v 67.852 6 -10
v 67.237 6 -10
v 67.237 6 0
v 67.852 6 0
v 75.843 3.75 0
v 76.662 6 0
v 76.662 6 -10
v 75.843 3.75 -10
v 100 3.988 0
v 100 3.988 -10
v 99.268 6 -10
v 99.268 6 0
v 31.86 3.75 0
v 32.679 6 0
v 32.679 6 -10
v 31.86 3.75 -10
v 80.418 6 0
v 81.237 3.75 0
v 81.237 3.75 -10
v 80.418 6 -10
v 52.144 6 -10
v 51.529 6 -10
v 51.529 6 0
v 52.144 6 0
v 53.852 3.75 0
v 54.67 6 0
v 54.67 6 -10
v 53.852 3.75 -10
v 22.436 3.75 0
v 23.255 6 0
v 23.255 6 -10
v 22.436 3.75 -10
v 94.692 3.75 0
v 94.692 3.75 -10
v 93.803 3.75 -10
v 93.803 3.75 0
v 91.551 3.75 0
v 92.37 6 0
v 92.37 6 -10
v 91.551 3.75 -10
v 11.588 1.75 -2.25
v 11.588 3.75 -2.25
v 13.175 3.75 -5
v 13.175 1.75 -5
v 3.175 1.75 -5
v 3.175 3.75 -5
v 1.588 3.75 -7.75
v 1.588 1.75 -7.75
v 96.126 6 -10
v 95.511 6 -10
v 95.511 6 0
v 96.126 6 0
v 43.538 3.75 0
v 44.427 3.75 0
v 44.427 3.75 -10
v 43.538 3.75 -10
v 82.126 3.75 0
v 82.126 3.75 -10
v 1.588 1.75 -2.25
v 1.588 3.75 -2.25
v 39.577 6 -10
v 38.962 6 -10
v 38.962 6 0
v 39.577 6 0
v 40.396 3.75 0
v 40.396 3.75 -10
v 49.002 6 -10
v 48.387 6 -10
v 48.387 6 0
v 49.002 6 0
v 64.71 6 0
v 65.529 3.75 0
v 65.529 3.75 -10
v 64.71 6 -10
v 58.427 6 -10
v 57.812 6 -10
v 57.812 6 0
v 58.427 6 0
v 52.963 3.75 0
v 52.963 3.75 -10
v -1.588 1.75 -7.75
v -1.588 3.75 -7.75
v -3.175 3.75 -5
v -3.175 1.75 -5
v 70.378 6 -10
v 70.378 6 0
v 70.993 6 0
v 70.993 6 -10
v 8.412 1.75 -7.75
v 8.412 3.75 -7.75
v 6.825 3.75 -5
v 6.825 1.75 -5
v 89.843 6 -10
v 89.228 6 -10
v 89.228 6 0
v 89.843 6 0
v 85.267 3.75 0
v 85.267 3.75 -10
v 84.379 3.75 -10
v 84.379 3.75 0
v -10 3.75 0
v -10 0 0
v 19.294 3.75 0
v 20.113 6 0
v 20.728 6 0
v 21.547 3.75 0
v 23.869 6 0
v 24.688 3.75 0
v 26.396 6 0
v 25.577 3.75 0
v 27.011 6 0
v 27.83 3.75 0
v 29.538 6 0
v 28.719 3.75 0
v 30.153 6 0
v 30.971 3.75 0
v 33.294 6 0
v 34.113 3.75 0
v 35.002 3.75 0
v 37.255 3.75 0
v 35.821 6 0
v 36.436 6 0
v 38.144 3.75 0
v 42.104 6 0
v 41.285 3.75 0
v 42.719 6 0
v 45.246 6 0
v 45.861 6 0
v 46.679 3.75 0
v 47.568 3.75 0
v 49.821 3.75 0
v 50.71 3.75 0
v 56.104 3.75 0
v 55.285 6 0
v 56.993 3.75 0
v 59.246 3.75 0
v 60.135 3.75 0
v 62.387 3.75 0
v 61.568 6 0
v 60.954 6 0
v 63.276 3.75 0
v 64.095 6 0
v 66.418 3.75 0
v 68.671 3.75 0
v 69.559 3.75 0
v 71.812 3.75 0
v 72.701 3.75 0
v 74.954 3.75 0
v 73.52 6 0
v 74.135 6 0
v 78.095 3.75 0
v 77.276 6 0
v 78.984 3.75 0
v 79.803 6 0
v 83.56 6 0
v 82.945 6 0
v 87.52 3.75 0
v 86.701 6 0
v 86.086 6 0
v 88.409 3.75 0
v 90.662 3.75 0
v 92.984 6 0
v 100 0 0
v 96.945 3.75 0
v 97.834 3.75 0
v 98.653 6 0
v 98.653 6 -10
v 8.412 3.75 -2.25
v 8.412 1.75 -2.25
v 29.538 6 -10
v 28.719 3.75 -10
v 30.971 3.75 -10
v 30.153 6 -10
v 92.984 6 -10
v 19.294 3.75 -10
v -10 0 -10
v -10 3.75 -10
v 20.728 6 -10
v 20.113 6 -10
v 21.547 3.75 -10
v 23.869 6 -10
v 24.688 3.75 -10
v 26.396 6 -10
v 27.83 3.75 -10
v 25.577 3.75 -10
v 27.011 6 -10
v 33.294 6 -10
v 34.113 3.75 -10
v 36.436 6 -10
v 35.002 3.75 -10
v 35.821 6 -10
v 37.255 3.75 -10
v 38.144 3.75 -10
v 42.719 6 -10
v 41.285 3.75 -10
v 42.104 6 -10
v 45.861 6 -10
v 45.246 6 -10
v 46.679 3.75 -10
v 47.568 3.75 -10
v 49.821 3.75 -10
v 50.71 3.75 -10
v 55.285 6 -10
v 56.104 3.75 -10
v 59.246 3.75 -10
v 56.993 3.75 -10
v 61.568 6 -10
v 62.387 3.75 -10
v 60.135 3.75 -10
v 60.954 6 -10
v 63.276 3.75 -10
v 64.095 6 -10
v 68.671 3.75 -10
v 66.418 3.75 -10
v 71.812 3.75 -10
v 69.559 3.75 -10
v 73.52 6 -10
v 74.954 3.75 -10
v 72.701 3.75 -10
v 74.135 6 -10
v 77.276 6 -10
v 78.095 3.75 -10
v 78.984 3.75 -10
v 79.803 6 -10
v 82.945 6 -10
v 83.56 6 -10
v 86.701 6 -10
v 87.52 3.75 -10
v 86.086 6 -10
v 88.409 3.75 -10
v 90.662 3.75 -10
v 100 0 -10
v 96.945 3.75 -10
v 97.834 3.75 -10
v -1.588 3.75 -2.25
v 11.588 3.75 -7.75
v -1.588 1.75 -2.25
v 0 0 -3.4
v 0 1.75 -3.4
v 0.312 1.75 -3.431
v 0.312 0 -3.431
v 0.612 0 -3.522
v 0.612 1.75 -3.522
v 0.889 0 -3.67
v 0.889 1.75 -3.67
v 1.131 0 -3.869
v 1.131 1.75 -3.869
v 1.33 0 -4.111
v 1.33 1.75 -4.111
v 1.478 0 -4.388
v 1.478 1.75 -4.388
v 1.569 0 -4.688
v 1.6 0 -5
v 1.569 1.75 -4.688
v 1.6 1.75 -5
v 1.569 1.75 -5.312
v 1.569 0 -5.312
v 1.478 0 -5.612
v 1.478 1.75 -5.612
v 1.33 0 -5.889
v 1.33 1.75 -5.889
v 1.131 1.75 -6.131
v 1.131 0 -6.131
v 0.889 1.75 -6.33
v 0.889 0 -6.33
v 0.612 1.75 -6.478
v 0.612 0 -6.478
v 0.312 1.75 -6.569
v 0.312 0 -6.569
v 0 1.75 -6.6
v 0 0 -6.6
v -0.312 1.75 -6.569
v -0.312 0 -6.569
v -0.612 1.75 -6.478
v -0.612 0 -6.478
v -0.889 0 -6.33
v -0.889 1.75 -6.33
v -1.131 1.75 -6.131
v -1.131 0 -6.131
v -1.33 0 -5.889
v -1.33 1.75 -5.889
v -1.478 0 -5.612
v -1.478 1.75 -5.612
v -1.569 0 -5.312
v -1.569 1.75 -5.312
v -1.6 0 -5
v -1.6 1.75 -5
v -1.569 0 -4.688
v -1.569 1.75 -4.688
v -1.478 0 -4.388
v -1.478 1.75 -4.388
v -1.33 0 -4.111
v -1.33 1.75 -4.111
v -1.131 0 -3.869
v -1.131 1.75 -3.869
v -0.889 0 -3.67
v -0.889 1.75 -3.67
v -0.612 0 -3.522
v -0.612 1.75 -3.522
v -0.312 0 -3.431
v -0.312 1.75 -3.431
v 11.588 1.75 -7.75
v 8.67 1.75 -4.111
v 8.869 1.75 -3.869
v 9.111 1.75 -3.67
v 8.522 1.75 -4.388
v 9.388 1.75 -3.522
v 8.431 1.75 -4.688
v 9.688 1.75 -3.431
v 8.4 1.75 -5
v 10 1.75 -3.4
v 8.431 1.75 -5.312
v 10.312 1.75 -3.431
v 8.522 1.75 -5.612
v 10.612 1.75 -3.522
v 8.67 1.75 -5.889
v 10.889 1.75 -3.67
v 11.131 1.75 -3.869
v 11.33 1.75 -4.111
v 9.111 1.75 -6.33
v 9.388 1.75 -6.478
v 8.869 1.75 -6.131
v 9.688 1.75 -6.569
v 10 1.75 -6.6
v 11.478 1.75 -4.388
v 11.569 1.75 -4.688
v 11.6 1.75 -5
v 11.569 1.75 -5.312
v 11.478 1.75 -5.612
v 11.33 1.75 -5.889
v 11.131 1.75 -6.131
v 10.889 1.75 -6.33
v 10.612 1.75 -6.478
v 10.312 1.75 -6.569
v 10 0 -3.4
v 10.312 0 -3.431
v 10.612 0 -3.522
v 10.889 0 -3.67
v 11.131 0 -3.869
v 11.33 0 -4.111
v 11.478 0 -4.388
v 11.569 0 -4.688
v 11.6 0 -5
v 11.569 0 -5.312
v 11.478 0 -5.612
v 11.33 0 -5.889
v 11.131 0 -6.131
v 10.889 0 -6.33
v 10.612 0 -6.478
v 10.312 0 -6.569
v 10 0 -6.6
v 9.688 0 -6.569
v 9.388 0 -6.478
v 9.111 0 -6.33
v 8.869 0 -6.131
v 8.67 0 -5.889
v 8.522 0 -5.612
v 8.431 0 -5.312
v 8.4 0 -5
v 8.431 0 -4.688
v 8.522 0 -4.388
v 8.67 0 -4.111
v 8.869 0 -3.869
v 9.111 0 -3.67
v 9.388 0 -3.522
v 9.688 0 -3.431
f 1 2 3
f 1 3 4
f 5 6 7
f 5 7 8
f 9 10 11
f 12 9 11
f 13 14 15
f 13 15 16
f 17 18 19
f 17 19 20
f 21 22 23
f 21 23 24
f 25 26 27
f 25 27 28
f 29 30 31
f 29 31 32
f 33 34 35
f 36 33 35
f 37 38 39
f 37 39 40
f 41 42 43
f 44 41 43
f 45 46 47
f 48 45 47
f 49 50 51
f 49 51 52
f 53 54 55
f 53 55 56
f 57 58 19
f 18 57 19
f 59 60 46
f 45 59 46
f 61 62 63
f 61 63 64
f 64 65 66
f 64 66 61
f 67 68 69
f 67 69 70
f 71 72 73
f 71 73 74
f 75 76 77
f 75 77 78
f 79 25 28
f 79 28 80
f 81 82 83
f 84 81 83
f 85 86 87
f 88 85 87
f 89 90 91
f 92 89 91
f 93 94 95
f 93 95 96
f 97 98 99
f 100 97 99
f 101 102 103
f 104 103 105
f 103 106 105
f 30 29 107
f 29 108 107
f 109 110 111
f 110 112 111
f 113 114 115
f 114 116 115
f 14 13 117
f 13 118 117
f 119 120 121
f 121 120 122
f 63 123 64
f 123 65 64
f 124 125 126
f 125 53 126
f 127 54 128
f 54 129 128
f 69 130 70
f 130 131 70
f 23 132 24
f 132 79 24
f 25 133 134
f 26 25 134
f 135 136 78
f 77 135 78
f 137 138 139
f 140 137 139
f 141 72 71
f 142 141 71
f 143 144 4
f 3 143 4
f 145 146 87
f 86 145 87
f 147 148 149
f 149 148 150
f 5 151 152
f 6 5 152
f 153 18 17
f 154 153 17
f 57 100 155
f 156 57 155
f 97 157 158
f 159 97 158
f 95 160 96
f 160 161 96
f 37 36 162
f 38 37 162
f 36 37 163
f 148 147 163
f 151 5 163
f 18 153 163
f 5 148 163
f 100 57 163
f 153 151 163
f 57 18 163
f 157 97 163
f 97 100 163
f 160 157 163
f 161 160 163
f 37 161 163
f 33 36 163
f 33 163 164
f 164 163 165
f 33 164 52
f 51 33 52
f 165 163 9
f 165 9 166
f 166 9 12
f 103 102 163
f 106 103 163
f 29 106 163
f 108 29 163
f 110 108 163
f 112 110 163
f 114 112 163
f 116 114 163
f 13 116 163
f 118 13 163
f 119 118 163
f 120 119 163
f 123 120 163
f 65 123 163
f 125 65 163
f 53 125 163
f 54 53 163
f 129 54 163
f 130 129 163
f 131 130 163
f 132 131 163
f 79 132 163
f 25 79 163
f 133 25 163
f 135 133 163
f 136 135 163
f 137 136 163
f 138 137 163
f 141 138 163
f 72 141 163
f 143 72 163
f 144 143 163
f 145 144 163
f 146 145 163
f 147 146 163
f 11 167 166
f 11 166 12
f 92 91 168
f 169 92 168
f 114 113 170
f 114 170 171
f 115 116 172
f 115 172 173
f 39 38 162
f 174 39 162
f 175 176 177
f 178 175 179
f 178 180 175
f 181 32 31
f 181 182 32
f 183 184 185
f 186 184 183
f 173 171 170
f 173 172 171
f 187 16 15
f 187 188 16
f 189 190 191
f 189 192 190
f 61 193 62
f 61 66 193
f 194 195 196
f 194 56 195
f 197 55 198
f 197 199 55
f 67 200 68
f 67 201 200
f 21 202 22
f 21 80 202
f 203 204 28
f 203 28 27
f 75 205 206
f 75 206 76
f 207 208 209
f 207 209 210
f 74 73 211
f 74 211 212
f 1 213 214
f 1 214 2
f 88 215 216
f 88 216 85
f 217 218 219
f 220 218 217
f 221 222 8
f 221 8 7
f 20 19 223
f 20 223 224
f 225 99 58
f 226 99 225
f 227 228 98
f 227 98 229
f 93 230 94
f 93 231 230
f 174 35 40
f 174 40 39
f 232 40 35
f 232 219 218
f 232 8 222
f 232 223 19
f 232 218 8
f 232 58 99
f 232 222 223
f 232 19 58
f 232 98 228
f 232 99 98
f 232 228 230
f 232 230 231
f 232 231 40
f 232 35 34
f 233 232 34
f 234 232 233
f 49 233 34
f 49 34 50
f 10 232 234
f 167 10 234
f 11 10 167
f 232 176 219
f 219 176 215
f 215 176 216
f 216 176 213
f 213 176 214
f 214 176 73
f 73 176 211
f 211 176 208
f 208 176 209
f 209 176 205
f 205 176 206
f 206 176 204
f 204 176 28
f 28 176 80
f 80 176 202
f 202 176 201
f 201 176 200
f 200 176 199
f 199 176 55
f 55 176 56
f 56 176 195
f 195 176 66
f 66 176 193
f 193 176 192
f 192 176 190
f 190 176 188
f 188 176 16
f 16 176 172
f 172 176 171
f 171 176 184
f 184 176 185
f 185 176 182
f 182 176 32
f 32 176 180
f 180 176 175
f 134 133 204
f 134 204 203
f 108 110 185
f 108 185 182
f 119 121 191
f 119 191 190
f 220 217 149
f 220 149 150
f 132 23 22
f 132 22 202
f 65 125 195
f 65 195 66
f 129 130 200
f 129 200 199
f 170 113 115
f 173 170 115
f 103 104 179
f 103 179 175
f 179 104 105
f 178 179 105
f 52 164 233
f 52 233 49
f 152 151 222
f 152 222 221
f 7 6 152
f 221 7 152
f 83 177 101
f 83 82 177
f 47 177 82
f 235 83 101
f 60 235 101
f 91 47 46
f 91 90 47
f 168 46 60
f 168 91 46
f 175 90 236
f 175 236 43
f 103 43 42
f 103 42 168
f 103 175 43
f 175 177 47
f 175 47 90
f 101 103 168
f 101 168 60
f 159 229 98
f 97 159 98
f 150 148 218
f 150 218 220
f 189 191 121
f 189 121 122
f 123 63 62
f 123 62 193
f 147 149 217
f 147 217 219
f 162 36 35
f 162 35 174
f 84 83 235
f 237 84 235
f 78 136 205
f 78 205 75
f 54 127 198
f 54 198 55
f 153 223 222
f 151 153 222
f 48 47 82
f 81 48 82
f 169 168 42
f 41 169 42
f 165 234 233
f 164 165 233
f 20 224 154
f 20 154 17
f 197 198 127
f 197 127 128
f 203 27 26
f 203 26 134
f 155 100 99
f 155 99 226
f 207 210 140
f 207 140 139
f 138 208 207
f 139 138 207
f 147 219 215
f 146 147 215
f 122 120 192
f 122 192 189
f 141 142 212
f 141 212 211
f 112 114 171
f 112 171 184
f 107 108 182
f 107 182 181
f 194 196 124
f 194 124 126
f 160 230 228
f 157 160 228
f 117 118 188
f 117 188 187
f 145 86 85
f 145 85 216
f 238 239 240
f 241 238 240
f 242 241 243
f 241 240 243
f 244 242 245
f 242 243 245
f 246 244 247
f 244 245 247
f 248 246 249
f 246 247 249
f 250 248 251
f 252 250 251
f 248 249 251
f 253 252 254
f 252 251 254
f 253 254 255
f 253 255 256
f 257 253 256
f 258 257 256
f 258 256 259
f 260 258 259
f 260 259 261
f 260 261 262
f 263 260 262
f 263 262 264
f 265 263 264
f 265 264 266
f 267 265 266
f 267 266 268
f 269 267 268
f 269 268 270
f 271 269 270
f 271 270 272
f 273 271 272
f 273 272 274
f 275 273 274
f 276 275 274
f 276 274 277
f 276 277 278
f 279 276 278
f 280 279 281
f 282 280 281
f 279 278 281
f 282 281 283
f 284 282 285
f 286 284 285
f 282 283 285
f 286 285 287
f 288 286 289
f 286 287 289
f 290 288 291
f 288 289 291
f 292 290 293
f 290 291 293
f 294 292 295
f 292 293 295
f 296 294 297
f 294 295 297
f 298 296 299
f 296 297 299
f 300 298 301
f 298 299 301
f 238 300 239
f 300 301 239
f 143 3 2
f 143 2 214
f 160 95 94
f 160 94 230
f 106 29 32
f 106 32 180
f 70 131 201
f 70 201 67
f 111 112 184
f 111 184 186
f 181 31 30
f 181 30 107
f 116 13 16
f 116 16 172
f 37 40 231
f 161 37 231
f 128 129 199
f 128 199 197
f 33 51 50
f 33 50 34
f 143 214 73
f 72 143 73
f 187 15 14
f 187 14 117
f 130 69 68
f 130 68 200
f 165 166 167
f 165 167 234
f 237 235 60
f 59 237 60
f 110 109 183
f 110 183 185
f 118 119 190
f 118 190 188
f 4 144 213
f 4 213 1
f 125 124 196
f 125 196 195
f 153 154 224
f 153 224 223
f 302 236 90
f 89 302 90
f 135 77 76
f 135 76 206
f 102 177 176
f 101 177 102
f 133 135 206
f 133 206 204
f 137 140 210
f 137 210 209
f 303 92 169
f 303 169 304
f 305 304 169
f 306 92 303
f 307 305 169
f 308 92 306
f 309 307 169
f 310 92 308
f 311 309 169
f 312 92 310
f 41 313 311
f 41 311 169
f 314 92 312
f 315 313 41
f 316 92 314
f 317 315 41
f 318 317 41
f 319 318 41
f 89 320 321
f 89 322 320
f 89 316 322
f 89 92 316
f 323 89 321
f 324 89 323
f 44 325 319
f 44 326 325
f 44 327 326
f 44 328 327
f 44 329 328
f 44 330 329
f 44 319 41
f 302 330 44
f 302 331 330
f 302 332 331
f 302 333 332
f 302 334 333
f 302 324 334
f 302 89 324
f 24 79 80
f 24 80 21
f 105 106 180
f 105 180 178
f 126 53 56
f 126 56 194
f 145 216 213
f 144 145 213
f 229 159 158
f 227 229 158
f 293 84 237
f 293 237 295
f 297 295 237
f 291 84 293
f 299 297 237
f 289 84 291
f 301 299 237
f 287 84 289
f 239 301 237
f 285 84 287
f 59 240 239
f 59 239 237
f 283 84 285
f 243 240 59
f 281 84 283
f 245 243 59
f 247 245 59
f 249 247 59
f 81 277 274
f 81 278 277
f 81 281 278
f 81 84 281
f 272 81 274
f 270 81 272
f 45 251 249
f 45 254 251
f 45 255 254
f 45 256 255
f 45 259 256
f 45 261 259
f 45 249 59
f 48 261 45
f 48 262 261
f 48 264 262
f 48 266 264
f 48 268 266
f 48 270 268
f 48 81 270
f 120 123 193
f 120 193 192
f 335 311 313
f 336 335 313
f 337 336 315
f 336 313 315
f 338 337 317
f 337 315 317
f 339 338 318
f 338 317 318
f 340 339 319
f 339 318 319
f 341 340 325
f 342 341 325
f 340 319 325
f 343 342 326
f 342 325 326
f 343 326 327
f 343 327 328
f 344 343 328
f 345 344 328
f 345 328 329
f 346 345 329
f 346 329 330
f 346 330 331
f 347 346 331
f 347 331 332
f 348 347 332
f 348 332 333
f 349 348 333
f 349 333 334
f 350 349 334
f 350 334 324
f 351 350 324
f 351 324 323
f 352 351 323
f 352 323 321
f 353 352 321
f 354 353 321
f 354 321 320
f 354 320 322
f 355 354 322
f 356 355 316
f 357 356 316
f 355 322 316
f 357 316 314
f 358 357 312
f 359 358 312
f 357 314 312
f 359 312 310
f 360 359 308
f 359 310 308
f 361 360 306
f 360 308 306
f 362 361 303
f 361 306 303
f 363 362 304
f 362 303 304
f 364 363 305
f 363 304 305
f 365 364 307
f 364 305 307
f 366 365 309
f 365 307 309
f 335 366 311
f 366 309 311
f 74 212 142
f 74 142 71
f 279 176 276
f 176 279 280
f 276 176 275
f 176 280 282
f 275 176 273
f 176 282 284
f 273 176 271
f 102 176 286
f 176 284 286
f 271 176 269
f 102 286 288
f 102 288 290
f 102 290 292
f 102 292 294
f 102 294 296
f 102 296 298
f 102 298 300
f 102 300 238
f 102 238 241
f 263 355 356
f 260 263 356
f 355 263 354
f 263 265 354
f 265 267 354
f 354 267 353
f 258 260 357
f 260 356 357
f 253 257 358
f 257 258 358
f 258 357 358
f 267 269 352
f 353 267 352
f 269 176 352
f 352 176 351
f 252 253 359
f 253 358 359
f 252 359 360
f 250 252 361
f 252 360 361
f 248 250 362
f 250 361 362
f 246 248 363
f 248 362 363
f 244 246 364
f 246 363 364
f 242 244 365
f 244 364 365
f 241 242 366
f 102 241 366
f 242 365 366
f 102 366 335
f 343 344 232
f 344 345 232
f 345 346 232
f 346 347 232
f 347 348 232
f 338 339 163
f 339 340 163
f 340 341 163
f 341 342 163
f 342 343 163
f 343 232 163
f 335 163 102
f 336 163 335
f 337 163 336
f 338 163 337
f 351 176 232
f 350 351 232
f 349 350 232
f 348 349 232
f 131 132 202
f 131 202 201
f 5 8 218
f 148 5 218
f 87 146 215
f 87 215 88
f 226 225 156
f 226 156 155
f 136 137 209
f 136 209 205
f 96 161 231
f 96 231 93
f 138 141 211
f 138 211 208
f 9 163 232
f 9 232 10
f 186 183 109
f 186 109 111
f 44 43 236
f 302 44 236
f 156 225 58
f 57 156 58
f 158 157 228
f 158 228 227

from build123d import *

# Parameters (mm, degrees)
BLANKSKE_W          = 100
BLANKSKE_H          = 6
BLANK_DEPTH         = 10
TOOTHCUTSIM_DEPTH   = 101.677703589
TEETHCUTS_COUNT     = 33
TEETHCUTS_PITCH     = 3.14159265
SKETCH_1_W          = 19.29399127
SKETCH_1_H          = 9.471097972
CUT_EXTRUDE_1_DEPTH = 10
SKETCH_2_W          = 10
SKETCH_2_H          = 3.75
EXTRUDE_1_DEPTH     = 10
SKETCH_3_R          = 1.6
CUT_EXTRUDE_2_DEPTH = 10
CUT_EXTRUDE_3_DEPTH = 2


with BuildPart() as part:
    # BlankSke → Blank (new body)
    with BuildSketch(Plane.XY):
        with Locations((50, 3)):
            Rectangle(BLANKSKE_W, BLANKSKE_H)
    extrude(amount=-BLANK_DEPTH)

    # TooCutSkeSim → ToothCutSim (cut, through all)
    with BuildSketch(Plane.XY):
        Polygon((0.44443537, 3.75), (-0.44443537, 3.75), (-1.272613241, 6.0254), (1.272613241, 6.0254), align=None)
    toothcutsim = extrude(amount=-TOOTHCUTSIM_DEPTH, mode=Mode.SUBTRACT)

    # TeethCuts: ToothCutSim ×33
    with Locations(*[(i * TEETHCUTS_PITCH, 0, 0) for i in range(1, TEETHCUTS_COUNT)]):
        add(toothcutsim, mode=Mode.SUBTRACT)

    # 草图1 → 切除-拉伸1 (cut)
    with BuildSketch(Plane.XY):
        with Locations((9.646995635, 8.485548986)):
            Rectangle(SKETCH_1_W, SKETCH_1_H)
    extrude(amount=-CUT_EXTRUDE_1_DEPTH, mode=Mode.SUBTRACT)

    # 草图2 → 凸台-拉伸1 (add)
    with BuildSketch(Plane.ZY):
        with Locations((-5, 1.875)):
            Rectangle(SKETCH_2_W, SKETCH_2_H)
    extrude(amount=EXTRUDE_1_DEPTH)

    # 草图3 → 切除-拉伸2 (cut)
    with BuildSketch(Plane(origin=(0, 3.75, 0), x_dir=(1, 0, 0), z_dir=(0, 1, 0))):
        with Locations((0, 5)):
            Circle(SKETCH_3_R)
        with Locations((10, 5)):
            Circle(SKETCH_3_R)
    extrude(amount=-CUT_EXTRUDE_2_DEPTH, mode=Mode.SUBTRACT)

    # 草图4 → 切除-拉伸3 (cut)
    with BuildSketch(Plane(origin=(0, 3.75, 0), x_dir=(1, 0, 0), z_dir=(0, 1, 0))):
        Polygon((-1.58771324, 7.75), (-3.175426481, 5), (-1.58771324, 2.25), (1.58771324, 2.25), (3.175426481, 5), (1.58771324, 7.75), align=None)
        Polygon((8.41228676, 7.75), (6.824573519, 5), (8.41228676, 2.25), (11.58771324, 2.25), (13.175426481, 5), (11.58771324, 7.75), align=None)
    extrude(amount=-CUT_EXTRUDE_3_DEPTH, mode=Mode.SUBTRACT)


solid = part.part
